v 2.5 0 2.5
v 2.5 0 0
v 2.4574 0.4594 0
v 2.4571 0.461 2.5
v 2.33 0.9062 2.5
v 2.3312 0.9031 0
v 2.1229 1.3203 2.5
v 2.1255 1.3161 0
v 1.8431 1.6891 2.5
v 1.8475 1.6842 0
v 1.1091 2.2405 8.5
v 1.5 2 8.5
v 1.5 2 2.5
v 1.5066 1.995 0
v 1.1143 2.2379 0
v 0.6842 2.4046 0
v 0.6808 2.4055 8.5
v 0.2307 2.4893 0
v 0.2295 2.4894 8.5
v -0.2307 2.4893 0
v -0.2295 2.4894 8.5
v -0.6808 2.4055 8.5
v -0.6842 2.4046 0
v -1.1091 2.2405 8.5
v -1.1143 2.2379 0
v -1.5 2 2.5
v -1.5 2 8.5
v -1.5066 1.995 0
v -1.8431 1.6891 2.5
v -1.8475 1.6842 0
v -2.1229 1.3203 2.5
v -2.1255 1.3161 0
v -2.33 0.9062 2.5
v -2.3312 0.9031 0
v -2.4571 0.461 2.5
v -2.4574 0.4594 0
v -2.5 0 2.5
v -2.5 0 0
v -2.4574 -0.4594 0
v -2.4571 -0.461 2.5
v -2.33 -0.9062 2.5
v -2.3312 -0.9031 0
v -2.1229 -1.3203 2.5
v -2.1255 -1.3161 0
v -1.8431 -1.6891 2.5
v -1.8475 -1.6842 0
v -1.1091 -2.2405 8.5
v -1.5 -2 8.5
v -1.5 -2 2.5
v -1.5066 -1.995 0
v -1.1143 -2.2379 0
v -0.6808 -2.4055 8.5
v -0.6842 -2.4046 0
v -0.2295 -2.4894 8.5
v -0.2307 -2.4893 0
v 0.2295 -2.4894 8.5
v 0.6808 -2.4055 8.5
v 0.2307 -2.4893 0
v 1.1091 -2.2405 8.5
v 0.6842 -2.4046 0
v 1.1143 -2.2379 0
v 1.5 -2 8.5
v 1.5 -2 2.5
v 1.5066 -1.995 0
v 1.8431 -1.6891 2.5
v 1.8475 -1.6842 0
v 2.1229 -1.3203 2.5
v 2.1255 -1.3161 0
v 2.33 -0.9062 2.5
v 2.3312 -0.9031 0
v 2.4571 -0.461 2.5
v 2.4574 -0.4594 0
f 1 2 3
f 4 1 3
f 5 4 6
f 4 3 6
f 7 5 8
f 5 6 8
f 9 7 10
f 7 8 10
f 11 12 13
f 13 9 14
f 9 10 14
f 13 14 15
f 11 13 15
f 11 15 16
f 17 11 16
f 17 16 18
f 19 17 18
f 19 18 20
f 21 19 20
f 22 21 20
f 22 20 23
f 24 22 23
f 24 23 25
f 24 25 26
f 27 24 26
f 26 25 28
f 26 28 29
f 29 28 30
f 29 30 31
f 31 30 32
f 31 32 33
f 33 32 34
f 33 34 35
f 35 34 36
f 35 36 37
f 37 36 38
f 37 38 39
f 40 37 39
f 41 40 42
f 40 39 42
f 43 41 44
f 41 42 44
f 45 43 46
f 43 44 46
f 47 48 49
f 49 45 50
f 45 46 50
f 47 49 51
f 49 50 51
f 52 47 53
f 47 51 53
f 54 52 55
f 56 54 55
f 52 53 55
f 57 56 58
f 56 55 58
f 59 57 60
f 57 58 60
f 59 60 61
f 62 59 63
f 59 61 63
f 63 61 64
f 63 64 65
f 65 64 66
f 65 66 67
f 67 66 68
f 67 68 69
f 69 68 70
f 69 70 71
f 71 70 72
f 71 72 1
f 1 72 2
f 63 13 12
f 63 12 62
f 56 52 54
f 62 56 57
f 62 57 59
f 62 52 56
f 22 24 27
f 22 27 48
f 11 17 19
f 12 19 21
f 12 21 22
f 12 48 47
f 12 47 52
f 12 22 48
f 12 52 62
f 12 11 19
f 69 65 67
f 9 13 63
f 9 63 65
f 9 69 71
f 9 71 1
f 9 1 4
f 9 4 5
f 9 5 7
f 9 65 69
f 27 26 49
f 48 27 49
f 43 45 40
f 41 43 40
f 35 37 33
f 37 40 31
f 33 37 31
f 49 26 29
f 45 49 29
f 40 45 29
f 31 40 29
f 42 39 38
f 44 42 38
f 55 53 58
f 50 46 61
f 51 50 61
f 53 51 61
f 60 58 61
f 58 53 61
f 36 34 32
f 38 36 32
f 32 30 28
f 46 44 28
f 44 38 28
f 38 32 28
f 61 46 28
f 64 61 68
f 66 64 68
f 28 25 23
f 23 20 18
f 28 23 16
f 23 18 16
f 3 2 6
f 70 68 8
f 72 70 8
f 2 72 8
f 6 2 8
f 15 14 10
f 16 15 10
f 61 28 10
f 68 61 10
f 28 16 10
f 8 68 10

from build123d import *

# Parameters (mm, degrees)
SKETCH1_R           = 2.5
BOSS_EXTRUDE1_DEPTH = 8.5
CUT_EXTRUDE1_START  = -6
CUT_EXTRUDE1_DEPTH  = 6


with BuildPart() as part:
    # Sketch1 → Boss-Extrude1 (new body)
    with BuildSketch(Plane.XY):
        Circle(SKETCH1_R)
    extrude(amount=BOSS_EXTRUDE1_DEPTH)

    # Sketch2 → Cut-Extrude1 (cut)
    with BuildSketch(Plane.XY.offset(8.5).offset(CUT_EXTRUDE1_START)):
        with BuildLine():
            Line((-1.5, 2), (-1.5, -2))
            ThreePointArc((-1.5, -2), (-2.5, 0), (-1.5, 2))
        make_face()
        with BuildLine():
            Line((1.5, 2), (1.5, -2))
            ThreePointArc((1.5, -2), (2.5, 0), (1.5, 2))
        make_face()
    extrude(amount=CUT_EXTRUDE1_DEPTH, mode=Mode.SUBTRACT)


solid = part.part
